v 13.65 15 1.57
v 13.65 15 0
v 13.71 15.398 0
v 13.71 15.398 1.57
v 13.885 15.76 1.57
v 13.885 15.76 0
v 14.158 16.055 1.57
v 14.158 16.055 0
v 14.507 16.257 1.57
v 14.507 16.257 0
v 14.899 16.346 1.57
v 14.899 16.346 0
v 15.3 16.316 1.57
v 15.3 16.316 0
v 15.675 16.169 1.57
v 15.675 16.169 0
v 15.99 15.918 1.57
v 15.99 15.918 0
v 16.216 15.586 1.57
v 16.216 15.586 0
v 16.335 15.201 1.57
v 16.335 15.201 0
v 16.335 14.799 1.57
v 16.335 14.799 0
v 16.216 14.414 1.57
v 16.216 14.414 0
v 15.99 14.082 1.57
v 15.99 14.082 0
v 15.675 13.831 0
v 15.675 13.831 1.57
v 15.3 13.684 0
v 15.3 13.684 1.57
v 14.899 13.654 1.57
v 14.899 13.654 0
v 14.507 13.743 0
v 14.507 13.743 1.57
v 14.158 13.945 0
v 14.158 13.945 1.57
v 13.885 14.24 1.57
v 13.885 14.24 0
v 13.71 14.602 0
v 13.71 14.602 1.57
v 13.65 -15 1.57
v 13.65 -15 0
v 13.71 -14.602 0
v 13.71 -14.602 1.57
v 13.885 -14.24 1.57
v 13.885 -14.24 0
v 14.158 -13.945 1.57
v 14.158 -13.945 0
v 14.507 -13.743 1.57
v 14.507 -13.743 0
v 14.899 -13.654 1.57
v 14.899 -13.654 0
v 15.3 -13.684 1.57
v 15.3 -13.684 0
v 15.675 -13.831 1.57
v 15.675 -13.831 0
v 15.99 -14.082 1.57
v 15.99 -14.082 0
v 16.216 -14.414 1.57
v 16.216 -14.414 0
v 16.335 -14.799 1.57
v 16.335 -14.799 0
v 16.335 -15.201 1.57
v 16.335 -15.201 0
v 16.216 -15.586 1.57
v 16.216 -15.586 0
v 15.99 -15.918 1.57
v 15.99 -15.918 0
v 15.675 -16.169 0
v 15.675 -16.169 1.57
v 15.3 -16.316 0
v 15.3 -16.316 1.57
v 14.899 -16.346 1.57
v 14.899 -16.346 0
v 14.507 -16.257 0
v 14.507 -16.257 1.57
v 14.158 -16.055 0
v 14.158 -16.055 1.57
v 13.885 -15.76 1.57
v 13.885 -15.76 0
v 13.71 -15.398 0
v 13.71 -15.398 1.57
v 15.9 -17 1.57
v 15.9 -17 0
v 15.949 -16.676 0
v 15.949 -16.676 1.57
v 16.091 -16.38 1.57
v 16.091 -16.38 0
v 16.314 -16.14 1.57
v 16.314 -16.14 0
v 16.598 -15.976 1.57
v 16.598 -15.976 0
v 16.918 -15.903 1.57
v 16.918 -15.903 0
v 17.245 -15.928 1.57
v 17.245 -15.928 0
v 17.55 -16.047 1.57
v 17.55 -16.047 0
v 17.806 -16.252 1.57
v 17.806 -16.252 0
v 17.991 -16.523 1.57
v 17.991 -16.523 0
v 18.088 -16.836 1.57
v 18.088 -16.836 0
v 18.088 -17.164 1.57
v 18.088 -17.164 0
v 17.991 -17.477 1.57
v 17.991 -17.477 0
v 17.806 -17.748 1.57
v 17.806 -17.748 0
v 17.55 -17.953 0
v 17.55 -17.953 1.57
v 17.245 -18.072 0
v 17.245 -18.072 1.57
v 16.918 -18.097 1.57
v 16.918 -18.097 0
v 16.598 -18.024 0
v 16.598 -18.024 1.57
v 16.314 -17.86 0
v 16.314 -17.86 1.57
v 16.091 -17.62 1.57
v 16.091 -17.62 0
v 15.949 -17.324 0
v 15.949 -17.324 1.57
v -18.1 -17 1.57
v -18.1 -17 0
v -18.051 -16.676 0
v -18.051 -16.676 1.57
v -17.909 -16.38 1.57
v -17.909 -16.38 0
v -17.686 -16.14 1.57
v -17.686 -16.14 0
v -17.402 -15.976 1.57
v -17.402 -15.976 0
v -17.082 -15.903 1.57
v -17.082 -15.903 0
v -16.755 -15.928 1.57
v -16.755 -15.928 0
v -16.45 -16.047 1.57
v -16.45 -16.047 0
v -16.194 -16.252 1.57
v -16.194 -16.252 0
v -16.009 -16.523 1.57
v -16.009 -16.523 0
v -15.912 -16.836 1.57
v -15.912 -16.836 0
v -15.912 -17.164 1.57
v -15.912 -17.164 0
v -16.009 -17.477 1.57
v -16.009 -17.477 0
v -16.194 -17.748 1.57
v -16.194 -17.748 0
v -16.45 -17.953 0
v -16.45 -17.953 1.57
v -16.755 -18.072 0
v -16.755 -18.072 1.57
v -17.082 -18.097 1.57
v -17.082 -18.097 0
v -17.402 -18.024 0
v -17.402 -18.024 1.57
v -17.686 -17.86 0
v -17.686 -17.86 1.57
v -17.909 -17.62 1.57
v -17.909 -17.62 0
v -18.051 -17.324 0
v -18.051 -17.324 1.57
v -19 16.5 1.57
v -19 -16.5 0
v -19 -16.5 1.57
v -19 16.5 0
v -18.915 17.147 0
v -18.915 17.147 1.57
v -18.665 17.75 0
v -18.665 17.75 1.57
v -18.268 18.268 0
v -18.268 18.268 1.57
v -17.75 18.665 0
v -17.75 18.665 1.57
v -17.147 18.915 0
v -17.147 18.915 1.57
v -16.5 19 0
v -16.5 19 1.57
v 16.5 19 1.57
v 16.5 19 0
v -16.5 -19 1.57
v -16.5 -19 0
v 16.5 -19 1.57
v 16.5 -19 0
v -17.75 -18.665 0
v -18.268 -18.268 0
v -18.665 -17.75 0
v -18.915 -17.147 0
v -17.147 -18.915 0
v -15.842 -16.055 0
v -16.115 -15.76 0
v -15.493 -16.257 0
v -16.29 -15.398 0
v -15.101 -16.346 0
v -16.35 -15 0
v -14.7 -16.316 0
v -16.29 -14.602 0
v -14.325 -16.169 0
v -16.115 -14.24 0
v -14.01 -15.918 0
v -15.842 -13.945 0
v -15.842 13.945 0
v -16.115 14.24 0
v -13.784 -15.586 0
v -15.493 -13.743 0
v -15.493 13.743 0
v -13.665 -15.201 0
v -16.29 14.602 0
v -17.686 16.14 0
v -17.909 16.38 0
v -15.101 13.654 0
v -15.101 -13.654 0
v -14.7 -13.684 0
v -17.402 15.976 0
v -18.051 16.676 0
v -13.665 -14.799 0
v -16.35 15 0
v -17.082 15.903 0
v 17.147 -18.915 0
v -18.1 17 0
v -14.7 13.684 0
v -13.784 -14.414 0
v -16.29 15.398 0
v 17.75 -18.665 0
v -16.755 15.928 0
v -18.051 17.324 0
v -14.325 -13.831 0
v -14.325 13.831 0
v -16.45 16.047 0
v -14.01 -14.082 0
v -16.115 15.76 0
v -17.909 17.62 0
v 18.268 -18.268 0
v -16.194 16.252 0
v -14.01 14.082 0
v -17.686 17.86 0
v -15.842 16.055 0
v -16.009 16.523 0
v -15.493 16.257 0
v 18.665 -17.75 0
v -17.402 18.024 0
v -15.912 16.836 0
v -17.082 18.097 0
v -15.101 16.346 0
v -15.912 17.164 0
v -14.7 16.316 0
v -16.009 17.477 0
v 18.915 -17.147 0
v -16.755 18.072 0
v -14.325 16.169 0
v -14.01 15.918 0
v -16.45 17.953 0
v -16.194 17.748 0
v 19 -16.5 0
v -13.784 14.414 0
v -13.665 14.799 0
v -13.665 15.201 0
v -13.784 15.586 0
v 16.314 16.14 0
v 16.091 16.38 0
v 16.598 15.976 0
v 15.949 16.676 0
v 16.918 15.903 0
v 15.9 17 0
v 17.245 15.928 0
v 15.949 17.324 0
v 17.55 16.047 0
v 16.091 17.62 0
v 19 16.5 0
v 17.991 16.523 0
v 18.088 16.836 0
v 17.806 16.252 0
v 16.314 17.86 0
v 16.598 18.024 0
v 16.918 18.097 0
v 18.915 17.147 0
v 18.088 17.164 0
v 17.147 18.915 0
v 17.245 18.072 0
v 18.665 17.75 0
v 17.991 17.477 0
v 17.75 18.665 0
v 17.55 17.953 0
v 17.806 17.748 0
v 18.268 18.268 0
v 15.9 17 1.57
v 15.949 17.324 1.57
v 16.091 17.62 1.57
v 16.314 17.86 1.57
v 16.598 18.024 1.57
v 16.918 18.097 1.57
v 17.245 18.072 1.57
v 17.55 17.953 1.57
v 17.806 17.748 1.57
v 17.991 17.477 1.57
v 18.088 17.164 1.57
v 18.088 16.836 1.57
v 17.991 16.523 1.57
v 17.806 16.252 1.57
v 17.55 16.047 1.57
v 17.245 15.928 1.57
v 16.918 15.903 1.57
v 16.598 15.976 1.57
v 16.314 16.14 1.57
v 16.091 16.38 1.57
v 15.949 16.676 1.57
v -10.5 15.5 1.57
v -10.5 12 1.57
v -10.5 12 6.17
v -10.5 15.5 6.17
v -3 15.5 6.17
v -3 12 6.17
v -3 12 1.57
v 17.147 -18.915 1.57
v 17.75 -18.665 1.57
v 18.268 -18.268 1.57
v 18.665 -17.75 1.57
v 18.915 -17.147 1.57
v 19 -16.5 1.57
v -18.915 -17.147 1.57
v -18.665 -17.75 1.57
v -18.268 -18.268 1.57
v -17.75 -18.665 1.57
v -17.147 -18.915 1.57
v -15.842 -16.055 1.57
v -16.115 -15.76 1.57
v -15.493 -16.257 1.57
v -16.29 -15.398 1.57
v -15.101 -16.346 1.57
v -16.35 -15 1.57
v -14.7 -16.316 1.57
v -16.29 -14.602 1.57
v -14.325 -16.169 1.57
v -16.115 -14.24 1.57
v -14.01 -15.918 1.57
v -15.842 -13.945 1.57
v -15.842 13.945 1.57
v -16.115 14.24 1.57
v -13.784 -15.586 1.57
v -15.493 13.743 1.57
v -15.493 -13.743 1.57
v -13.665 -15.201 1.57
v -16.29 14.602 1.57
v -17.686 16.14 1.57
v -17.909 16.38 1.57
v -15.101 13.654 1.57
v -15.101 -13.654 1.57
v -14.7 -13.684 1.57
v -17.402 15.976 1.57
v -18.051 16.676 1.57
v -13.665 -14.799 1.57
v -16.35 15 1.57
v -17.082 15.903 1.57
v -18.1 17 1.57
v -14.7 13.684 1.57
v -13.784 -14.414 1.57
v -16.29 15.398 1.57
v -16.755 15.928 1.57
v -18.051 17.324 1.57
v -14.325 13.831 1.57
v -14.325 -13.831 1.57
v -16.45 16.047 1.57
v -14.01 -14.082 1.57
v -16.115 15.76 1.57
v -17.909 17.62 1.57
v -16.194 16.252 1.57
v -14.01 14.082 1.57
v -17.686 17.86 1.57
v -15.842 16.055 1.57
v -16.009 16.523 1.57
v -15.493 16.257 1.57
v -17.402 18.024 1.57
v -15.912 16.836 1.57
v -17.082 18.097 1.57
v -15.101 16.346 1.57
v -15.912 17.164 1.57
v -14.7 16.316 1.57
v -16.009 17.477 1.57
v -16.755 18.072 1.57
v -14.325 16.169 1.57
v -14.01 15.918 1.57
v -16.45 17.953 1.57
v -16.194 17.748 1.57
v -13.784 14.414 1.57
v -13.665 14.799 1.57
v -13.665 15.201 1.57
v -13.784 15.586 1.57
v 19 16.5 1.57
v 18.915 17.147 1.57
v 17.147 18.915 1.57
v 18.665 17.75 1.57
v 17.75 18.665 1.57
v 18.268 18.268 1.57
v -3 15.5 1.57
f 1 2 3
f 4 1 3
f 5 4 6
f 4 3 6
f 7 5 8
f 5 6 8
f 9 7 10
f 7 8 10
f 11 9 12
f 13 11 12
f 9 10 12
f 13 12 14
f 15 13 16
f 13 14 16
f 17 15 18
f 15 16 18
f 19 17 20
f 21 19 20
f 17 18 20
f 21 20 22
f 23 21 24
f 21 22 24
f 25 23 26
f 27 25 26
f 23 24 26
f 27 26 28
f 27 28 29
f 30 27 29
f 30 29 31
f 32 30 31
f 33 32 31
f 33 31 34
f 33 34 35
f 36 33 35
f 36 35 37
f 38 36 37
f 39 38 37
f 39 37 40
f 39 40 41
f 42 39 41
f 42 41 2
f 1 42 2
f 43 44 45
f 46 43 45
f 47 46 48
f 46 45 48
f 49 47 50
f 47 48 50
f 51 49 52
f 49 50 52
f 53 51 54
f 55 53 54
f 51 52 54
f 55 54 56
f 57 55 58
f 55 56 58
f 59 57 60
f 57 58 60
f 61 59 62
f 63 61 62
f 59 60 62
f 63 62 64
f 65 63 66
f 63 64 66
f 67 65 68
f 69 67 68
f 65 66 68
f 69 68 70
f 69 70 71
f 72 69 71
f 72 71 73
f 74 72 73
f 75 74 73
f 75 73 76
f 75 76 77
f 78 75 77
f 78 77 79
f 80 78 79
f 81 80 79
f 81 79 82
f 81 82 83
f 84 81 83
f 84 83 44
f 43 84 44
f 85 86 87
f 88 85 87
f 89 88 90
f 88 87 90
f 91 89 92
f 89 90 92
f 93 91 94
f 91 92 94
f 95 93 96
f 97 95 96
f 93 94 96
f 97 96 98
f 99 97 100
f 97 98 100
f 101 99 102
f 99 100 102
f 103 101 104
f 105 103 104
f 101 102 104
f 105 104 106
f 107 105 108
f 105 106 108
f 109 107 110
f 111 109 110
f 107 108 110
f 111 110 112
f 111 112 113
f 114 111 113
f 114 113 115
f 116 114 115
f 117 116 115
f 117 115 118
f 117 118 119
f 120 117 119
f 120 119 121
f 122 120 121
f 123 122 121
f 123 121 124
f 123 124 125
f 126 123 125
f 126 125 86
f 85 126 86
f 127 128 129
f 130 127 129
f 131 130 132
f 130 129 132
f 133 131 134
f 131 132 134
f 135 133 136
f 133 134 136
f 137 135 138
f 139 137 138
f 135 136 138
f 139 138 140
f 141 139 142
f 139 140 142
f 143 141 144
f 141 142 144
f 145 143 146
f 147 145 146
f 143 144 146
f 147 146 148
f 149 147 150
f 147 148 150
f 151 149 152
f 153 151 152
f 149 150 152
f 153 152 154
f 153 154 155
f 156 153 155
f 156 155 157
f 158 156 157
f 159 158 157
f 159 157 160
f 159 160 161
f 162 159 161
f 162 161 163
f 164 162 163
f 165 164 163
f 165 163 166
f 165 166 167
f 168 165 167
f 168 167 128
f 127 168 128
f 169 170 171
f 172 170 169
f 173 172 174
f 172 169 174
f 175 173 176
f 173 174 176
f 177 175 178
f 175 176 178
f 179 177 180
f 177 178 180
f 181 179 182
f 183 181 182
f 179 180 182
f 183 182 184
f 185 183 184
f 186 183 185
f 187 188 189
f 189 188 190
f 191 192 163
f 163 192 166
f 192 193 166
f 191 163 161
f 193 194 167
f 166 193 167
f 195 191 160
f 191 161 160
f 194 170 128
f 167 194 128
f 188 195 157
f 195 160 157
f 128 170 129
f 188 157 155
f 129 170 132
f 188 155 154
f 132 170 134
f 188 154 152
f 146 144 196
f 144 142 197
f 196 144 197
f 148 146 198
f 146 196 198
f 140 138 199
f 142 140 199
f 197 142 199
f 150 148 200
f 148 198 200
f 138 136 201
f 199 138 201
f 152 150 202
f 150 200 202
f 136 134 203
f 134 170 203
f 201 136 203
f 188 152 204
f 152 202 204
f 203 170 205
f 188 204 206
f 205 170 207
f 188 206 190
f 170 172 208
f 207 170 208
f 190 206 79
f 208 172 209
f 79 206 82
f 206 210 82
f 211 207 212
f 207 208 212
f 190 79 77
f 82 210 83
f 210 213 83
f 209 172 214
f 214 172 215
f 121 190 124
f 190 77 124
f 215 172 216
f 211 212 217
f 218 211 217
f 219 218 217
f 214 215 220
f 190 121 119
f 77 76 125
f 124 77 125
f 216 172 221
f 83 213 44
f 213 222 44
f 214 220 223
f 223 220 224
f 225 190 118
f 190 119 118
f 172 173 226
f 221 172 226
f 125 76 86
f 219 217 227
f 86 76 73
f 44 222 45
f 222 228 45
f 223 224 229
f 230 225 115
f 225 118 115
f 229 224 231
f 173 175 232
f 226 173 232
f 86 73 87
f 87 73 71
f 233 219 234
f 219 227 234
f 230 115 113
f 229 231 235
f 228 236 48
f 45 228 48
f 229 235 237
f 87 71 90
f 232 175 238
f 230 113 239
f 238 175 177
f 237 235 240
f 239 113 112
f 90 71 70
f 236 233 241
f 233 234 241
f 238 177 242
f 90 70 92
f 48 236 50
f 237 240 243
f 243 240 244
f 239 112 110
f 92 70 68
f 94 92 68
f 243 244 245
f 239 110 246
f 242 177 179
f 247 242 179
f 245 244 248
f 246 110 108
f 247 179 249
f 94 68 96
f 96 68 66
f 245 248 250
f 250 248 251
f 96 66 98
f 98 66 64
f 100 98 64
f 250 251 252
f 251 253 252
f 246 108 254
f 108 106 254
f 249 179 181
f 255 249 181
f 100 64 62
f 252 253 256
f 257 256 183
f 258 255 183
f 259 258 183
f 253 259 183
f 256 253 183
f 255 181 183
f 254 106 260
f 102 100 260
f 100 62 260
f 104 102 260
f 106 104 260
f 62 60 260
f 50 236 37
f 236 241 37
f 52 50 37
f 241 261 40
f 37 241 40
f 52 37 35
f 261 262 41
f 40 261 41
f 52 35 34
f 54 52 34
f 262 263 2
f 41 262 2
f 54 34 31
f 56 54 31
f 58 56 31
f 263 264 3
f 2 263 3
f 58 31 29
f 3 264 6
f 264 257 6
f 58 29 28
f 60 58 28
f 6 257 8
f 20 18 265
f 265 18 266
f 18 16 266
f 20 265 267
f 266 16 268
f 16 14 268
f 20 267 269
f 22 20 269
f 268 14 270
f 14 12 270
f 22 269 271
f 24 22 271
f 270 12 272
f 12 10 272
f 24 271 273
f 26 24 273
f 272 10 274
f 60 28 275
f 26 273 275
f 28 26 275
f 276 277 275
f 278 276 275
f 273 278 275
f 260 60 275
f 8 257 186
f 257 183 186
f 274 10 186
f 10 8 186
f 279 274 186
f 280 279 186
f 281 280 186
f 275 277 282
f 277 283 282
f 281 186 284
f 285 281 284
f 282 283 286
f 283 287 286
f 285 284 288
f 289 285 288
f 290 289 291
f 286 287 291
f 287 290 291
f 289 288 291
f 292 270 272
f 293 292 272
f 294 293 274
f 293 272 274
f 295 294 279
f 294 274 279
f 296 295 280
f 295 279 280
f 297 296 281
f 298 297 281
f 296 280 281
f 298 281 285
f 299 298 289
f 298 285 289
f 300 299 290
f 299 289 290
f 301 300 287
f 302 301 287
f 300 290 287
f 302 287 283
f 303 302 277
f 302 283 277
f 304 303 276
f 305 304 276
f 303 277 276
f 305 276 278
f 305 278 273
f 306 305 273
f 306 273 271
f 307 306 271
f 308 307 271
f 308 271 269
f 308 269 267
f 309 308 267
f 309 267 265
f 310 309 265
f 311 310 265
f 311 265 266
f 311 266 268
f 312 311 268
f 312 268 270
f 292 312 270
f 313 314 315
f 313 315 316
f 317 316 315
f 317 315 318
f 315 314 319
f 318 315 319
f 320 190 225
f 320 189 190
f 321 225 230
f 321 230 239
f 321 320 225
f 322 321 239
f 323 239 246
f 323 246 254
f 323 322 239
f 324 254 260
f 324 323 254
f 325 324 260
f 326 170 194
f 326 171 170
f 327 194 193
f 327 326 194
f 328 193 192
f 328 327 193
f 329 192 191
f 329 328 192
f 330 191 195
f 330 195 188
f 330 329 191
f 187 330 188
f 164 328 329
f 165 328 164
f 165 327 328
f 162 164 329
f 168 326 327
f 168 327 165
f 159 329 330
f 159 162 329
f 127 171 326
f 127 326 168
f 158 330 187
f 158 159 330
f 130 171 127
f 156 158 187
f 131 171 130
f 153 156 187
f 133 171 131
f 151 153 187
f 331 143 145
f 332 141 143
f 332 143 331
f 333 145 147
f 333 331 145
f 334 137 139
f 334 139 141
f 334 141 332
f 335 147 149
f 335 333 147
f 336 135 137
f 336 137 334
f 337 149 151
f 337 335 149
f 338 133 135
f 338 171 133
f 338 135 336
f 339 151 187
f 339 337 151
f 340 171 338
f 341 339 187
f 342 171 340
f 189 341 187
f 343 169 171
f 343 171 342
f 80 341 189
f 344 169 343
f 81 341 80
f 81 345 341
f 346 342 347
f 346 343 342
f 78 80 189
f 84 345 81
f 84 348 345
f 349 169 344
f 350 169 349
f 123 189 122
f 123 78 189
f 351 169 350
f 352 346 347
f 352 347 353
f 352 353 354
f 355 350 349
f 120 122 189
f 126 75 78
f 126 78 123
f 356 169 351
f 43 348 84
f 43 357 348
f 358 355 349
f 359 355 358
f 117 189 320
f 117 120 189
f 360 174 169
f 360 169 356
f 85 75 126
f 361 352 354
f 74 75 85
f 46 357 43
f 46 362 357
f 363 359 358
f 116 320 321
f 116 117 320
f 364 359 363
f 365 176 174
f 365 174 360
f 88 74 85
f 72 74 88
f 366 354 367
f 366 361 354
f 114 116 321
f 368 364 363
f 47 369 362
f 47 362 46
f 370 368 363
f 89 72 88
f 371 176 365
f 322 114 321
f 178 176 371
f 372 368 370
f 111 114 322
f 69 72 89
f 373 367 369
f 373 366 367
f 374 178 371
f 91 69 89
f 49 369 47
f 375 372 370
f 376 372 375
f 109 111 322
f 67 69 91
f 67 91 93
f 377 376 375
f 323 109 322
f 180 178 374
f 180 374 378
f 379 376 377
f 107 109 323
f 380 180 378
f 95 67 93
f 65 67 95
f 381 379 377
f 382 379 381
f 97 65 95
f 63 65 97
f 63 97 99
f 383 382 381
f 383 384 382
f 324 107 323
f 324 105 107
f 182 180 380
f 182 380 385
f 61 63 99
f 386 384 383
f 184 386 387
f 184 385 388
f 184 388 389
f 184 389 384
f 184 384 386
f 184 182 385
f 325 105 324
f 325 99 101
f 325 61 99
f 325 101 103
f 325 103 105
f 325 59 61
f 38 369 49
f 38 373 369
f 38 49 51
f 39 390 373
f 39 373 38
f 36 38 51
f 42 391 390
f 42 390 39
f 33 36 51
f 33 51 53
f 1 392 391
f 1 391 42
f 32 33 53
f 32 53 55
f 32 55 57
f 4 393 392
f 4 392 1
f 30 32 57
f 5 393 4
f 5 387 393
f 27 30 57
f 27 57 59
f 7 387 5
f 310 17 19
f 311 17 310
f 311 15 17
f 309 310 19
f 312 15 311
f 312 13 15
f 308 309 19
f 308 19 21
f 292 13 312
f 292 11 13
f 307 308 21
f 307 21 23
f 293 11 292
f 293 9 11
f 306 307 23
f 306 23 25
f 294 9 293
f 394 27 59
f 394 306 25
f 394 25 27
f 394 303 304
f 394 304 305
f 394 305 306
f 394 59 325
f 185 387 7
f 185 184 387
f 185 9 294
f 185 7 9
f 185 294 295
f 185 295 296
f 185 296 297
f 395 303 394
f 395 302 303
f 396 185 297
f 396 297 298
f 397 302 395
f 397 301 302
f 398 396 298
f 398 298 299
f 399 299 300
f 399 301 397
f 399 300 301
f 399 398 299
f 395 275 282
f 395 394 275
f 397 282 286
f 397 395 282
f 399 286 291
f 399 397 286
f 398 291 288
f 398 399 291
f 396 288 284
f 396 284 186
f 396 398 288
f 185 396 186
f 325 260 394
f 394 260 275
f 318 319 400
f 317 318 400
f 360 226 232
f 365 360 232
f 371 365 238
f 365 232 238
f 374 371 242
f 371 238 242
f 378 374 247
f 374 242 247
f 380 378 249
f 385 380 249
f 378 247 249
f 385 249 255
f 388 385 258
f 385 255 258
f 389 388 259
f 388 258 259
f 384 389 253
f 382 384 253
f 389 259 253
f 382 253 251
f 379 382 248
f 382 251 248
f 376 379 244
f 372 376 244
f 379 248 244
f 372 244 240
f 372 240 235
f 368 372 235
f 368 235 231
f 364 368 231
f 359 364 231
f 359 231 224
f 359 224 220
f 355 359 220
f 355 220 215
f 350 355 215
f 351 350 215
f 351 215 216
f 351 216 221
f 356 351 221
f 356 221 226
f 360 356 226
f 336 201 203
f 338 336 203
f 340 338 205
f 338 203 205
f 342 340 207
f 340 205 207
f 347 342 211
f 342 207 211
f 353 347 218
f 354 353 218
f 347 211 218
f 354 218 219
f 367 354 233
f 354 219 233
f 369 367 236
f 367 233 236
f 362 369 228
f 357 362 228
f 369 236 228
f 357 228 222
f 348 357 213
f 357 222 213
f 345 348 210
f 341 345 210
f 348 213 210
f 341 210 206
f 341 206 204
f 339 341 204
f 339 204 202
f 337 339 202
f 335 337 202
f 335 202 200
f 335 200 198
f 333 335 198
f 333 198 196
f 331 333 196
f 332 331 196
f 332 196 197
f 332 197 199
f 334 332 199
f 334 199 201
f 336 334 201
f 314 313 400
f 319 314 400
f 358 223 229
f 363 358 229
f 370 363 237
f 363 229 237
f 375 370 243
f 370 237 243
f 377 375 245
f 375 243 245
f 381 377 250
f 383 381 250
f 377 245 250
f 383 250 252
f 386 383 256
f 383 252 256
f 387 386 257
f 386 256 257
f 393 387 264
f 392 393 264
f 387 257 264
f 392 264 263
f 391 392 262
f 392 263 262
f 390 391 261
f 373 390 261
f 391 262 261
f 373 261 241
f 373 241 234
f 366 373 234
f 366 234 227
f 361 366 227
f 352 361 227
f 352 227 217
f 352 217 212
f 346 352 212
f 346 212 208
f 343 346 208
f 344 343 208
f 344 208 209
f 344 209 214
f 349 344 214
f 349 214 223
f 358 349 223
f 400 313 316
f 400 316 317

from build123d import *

# Parameters (mm, degrees)
SKETCH1_W              = 38
SKETCH1_H              = 38
BOSS_EXTRUDE1_DEPTH    = 1.57
FILLET1_R              = 2.5
M2_CLEARANCE_HOLE1_D   = 2.2
M2_5_CLEARANCE_HOLE1_D = 2.7
SKETCH6_W              = 7.5
SKETCH6_H              = 3.5
BOSS_EXTRUDE2_DEPTH    = 4.6


with BuildPart() as part:
    # Sketch1 → Boss-Extrude1 (new body)
    with BuildSketch(Plane.XY):
        Rectangle(SKETCH1_W, SKETCH1_H)
    extrude(amount=BOSS_EXTRUDE1_DEPTH)

    # Fillet1
    fillet1_edges = [part.edges().sort_by_distance(p)[0] for p in [
        (19, -19, 0.785),
        (-19, -19, 0.785),
        (-19, 19, 0.785),
        (19, 19, 0.785),
    ]]
    fillet(fillet1_edges, radius=FILLET1_R)

    # M2 Clearance Hole1 (through all)
    with Locations(Plane.XY.offset(1.57)):
        with Locations((-17, 17), (17, -17), (-17, -17), (17, 17)):
            Hole(M2_CLEARANCE_HOLE1_D / 2)

    # M2.5 Clearance Hole1 (through all)
    with Locations(Plane.XY.offset(1.57)):
        with Locations((-15, 15), (15, -15), (-15, -15), (15, 15)):
            Hole(M2_5_CLEARANCE_HOLE1_D / 2)


with BuildPart() as body_2:
    # Sketch6 → Boss-Extrude2 (new body)
    with BuildSketch(Plane.XY.offset(1.57)):
        with Locations((-6.75, 13.75)):
            Rectangle(SKETCH6_W, SKETCH6_H)
    extrude(amount=BOSS_EXTRUDE2_DEPTH)


solid = Compound([part.part, body_2.part])
